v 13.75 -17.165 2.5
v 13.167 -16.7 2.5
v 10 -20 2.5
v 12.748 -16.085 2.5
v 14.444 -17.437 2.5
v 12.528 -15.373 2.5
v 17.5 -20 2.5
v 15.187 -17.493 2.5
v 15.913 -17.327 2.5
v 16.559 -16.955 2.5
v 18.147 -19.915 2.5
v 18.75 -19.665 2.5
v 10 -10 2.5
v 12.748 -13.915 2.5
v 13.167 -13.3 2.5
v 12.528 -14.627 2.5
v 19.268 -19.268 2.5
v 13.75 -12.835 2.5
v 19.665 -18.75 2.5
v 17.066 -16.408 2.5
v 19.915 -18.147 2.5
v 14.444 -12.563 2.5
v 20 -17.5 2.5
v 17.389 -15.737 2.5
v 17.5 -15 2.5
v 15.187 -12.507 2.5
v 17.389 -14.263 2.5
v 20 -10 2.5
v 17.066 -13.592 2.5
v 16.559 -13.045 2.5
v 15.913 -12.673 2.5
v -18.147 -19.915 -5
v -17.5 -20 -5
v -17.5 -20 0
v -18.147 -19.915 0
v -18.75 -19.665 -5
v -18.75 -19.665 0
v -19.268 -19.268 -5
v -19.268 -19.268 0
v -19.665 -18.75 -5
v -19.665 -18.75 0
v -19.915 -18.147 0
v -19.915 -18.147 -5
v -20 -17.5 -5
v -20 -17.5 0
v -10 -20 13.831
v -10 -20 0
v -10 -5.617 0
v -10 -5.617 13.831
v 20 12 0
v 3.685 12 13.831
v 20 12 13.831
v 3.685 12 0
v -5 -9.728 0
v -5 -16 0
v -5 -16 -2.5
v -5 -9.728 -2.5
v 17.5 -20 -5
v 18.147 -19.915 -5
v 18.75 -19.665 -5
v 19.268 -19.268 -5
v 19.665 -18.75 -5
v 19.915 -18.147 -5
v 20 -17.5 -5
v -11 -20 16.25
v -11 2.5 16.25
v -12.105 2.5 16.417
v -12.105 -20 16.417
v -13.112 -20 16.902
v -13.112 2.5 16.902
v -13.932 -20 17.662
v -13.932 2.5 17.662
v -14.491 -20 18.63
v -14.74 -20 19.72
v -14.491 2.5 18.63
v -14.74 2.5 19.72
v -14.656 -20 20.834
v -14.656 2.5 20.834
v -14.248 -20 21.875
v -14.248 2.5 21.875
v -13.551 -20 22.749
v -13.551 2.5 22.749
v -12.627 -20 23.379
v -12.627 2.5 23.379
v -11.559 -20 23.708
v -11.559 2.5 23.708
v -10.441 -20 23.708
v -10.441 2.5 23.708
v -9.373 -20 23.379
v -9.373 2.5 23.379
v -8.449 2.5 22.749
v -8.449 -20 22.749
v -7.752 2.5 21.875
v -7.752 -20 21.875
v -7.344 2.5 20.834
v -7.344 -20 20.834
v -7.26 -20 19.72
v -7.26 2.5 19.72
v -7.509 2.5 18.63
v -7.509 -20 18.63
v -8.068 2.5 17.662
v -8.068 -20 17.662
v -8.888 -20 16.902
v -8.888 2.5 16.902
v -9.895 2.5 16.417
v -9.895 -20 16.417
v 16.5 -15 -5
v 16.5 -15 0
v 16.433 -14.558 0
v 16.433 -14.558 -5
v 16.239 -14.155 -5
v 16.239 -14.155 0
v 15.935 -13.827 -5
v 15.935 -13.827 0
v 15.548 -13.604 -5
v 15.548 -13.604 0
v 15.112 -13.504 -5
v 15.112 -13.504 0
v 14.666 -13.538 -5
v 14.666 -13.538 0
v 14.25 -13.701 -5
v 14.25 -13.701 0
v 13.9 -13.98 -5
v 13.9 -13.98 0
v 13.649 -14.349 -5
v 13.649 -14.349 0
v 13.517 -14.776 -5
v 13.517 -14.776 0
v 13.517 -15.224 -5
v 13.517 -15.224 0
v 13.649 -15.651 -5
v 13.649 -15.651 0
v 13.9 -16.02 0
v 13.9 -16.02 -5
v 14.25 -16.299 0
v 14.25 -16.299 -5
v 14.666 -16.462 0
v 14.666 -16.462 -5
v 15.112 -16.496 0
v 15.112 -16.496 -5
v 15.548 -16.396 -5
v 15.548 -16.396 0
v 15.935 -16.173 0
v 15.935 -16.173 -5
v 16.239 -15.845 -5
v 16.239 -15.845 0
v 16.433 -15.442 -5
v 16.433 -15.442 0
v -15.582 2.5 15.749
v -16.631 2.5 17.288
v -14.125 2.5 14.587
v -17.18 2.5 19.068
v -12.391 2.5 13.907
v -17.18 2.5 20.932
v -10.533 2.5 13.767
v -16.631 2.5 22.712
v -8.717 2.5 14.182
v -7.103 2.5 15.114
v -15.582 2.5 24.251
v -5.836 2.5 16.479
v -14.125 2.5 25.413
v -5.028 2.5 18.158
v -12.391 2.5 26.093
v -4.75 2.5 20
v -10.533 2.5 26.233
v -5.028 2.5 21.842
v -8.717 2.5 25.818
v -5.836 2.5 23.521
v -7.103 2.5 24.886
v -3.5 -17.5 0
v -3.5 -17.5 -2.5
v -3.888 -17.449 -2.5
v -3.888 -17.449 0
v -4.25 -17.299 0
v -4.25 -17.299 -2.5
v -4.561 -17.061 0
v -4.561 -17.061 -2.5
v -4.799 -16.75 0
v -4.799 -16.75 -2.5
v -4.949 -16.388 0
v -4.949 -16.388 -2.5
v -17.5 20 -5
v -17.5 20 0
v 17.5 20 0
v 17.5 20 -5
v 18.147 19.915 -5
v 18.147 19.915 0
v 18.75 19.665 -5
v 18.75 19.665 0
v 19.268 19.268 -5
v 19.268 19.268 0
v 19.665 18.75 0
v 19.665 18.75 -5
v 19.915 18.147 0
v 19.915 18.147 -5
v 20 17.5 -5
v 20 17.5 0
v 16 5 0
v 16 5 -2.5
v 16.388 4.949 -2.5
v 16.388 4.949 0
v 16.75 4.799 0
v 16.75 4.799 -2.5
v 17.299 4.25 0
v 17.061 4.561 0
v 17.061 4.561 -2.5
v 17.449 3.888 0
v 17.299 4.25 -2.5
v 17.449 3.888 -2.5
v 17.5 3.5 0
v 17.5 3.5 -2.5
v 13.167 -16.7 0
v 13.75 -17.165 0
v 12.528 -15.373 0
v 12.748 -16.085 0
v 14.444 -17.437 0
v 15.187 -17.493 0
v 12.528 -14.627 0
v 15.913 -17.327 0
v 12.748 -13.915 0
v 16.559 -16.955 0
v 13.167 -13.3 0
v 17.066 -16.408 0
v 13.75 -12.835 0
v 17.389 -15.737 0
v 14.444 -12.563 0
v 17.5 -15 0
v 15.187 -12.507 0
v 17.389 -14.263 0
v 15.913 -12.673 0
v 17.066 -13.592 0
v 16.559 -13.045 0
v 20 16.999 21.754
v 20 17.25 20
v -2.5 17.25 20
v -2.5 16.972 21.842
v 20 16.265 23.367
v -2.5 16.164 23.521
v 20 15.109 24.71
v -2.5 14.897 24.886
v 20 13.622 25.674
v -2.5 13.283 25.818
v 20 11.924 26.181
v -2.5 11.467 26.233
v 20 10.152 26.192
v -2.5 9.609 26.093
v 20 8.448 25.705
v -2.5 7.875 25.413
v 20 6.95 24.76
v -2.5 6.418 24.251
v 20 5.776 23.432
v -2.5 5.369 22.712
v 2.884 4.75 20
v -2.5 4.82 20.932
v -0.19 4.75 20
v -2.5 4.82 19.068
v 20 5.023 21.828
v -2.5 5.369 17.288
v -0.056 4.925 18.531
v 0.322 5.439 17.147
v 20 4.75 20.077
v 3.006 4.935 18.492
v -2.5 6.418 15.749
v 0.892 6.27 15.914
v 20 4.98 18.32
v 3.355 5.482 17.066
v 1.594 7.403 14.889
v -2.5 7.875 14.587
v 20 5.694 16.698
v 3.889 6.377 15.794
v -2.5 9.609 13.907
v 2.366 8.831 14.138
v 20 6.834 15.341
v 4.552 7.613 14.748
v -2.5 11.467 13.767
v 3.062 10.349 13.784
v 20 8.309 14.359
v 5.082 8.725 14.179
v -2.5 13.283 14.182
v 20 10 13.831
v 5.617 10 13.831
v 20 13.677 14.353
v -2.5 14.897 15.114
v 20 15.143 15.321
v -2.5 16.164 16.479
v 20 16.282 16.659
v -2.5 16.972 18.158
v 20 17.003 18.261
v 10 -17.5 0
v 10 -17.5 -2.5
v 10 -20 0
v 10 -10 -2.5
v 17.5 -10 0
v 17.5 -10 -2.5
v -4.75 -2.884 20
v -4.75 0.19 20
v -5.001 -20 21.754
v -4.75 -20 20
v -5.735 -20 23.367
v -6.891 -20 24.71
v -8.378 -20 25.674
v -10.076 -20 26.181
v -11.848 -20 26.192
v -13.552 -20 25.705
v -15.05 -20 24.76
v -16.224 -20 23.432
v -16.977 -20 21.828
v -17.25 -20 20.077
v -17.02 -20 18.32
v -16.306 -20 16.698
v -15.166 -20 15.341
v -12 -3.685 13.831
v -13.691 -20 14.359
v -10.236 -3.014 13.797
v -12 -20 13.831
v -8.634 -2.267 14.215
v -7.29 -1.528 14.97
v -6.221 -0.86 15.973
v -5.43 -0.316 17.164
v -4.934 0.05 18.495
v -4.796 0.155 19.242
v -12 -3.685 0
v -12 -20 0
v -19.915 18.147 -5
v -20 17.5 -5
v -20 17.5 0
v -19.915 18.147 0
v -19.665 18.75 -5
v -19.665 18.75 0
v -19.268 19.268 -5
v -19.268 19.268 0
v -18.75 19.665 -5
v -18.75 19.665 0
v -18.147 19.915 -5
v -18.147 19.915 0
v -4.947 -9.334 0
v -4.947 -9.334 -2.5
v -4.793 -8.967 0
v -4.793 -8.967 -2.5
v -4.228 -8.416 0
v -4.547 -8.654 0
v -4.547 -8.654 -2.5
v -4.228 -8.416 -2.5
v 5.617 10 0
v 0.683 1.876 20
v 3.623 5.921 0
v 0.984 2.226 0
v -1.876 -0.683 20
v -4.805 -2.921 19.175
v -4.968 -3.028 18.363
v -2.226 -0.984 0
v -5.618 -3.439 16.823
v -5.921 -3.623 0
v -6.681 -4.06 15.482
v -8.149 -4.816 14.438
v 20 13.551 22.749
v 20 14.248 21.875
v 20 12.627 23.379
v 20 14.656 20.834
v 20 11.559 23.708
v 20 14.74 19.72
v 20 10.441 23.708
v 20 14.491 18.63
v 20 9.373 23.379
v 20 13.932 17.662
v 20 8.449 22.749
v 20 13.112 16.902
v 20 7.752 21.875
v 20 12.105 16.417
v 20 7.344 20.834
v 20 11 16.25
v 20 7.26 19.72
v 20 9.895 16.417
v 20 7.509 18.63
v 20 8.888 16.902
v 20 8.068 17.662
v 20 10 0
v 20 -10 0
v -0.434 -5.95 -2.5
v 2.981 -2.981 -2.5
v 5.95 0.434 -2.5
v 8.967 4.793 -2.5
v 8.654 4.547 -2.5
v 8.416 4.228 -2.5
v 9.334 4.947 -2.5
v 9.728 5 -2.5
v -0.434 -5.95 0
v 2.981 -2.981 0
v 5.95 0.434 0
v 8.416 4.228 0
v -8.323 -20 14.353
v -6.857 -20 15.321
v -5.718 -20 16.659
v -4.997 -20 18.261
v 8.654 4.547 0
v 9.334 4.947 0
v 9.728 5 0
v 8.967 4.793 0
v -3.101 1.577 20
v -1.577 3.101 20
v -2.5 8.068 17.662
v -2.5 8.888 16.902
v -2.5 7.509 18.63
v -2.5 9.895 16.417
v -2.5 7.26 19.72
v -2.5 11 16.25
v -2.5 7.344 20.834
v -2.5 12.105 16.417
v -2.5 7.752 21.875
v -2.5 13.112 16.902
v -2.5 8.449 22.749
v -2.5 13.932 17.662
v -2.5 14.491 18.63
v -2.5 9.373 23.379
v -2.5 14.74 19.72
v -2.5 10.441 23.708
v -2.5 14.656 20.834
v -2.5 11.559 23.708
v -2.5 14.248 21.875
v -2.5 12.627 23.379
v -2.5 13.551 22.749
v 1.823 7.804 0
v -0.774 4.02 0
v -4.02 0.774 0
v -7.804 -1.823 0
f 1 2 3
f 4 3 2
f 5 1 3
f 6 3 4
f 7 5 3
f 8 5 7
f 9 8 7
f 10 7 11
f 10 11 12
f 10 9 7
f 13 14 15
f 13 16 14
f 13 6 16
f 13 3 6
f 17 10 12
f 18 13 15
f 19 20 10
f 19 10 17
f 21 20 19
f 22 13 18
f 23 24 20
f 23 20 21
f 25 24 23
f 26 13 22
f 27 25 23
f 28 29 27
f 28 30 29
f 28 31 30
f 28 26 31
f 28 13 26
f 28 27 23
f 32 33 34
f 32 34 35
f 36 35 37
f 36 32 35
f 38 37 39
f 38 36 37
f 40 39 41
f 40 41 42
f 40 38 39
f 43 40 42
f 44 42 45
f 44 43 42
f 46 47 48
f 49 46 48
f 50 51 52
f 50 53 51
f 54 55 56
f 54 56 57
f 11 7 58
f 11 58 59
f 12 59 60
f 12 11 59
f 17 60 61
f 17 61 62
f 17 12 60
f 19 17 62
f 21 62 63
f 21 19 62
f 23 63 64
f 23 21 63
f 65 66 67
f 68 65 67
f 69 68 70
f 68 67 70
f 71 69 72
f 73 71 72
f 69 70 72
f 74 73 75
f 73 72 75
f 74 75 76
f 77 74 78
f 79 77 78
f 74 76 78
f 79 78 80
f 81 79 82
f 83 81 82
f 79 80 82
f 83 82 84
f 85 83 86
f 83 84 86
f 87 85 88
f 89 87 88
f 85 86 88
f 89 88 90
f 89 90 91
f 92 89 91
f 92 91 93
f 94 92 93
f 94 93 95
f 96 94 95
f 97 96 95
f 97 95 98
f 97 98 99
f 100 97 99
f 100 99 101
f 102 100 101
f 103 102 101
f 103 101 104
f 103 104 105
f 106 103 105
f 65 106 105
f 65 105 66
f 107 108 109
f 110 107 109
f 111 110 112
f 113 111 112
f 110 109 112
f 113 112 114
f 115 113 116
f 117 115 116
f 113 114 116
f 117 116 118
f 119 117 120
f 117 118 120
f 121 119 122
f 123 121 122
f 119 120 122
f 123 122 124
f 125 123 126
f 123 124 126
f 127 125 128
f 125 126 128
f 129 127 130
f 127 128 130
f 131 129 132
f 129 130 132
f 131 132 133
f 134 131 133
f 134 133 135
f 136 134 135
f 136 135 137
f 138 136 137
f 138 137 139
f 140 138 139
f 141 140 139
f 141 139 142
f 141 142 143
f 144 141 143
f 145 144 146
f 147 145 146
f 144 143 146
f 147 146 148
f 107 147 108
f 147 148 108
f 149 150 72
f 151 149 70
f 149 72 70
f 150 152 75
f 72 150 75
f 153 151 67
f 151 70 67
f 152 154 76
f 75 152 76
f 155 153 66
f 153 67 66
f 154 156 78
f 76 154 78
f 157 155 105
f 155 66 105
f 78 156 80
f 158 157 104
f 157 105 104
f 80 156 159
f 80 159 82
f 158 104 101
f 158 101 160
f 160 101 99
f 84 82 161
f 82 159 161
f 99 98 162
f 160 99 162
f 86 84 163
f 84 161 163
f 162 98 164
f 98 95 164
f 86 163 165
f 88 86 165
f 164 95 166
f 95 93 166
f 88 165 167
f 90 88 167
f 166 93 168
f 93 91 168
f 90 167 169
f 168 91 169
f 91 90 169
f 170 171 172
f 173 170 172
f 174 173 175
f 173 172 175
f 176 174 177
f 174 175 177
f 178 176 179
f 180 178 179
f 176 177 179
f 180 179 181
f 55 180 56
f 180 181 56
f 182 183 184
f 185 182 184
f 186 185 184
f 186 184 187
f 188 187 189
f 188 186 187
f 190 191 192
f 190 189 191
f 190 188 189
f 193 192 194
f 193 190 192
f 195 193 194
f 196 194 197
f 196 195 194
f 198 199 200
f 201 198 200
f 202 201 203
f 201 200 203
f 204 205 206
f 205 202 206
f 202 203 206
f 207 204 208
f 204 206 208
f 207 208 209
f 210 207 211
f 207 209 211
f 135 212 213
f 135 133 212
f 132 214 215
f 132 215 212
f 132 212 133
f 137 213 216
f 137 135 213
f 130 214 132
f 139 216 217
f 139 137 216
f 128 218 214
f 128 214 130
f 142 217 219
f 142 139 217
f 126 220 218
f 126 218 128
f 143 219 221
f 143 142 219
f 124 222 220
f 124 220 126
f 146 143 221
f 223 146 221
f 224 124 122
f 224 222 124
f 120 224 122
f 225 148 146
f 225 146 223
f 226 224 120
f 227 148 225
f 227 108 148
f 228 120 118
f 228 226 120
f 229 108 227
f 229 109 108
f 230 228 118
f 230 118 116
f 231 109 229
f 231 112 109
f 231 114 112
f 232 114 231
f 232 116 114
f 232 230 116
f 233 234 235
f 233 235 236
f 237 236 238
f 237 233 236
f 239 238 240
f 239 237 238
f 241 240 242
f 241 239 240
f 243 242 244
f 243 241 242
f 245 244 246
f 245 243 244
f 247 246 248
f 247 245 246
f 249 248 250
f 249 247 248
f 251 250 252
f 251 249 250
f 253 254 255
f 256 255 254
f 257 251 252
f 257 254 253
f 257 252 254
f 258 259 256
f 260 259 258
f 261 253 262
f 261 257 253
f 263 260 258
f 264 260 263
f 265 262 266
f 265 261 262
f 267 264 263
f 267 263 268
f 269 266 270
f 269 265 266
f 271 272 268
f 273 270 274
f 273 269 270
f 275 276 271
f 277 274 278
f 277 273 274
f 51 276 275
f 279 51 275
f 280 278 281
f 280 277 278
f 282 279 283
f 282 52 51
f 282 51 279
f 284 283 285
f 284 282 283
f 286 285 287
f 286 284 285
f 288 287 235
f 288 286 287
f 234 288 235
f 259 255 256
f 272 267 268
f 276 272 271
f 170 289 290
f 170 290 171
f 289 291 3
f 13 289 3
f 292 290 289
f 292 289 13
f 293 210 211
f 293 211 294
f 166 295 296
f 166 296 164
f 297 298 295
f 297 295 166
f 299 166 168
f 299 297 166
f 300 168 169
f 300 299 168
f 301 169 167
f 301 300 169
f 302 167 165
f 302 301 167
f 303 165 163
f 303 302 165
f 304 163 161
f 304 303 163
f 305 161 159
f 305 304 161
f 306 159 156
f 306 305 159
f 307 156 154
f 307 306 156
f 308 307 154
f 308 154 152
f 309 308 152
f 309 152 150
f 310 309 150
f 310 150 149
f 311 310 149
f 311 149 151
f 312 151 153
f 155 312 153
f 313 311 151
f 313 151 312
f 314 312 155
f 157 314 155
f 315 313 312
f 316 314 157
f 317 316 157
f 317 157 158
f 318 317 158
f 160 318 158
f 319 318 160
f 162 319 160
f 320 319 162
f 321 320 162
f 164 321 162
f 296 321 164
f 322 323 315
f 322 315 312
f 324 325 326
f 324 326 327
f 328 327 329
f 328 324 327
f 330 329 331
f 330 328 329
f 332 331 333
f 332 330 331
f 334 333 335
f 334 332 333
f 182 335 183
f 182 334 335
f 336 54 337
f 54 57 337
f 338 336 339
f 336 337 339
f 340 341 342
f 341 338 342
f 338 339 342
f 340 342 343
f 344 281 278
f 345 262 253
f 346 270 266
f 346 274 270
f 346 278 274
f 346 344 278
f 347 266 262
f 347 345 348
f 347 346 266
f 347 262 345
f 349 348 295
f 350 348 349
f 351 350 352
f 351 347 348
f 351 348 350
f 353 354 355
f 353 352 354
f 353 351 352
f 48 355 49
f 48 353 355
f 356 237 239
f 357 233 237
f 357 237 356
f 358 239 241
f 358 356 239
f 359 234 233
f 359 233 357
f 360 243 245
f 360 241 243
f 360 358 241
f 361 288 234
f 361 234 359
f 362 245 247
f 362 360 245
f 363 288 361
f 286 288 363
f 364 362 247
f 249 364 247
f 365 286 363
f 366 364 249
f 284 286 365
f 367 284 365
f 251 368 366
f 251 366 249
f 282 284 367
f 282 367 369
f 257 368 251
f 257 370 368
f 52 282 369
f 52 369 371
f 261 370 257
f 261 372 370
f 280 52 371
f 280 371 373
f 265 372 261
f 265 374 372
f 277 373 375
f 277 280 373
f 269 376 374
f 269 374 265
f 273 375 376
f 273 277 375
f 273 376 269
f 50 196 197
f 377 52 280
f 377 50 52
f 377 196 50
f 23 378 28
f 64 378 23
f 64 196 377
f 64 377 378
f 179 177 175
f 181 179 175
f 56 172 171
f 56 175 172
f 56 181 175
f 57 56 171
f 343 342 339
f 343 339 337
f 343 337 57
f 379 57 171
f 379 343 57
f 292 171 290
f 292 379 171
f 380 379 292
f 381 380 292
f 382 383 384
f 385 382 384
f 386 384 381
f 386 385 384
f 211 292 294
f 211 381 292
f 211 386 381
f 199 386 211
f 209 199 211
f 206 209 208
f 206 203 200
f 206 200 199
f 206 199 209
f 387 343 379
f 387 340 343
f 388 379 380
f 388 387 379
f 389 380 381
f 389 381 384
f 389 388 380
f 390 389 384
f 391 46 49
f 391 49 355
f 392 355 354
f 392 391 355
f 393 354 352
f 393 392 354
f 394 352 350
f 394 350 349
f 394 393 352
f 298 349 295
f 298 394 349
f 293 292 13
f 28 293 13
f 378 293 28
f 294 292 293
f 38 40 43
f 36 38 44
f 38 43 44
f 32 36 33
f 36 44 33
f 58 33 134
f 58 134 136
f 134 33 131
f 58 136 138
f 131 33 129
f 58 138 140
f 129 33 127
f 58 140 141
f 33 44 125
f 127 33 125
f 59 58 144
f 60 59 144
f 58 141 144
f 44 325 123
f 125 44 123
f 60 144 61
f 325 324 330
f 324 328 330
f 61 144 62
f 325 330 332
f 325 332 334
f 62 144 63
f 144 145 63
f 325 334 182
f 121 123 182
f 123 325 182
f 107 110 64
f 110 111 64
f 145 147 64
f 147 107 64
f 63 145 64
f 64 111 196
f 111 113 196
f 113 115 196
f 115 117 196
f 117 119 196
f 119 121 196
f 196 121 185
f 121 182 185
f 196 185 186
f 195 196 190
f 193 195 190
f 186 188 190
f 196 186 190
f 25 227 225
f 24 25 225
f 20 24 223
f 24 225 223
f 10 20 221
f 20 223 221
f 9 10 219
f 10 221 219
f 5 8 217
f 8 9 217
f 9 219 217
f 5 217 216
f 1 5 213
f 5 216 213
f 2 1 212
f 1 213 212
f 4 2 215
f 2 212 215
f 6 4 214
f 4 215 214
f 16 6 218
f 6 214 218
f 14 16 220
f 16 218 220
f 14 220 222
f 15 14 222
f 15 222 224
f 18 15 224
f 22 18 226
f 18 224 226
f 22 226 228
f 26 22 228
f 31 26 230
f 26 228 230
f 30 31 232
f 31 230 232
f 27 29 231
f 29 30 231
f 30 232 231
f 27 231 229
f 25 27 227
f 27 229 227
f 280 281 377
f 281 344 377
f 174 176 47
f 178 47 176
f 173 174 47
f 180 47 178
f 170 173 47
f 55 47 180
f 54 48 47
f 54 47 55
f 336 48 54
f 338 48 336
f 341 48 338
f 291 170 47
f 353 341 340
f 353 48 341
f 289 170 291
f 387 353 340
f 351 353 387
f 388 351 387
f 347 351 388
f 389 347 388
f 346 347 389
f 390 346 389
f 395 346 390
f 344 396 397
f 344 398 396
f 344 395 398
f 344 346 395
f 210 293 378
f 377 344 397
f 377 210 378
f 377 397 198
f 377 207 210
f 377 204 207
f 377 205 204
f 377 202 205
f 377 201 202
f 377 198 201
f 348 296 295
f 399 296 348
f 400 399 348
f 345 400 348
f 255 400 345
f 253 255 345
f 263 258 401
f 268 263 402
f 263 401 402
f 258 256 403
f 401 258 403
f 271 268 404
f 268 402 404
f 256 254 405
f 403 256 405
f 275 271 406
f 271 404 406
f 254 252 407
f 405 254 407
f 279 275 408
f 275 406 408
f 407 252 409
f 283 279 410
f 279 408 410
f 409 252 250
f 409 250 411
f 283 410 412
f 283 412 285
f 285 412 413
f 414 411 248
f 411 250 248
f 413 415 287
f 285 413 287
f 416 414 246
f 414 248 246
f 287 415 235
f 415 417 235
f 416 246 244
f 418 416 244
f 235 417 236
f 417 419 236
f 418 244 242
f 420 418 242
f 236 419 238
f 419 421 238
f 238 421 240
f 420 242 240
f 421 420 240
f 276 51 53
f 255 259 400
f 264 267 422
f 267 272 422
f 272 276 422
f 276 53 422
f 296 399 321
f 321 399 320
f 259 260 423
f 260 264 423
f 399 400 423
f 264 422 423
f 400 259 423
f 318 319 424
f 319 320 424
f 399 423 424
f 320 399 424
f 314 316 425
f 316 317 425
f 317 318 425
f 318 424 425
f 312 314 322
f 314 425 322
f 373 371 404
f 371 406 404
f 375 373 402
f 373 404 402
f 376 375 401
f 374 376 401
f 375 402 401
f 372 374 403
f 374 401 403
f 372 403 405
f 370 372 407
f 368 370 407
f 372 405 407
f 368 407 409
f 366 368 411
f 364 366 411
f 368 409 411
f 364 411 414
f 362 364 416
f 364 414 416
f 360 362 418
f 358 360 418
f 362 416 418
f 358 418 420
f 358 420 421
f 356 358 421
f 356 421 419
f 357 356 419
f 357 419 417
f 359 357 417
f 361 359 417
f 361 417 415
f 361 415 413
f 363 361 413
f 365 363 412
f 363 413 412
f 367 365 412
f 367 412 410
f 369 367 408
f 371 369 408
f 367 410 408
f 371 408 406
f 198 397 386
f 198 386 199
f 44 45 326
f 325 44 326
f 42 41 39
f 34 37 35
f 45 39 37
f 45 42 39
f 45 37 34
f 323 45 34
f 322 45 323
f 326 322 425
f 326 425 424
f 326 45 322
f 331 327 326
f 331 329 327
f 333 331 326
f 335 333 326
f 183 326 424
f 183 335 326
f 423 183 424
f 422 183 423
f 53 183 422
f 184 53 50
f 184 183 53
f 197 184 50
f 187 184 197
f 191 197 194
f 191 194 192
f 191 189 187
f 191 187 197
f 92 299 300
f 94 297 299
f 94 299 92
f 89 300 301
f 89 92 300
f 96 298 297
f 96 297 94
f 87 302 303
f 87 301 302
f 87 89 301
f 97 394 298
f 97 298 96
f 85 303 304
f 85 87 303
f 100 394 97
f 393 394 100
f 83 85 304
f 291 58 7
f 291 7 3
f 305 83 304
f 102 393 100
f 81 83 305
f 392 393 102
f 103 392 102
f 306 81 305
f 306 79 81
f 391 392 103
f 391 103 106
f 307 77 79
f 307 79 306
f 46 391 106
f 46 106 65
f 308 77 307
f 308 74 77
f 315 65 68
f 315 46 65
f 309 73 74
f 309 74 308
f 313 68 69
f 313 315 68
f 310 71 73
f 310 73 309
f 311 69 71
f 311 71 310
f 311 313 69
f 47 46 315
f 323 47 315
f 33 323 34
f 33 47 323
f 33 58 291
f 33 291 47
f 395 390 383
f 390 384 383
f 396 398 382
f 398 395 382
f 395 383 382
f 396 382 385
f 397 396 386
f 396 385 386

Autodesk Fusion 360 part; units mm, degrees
sketch "Sketch1" plane through (0, 0, 0) normal (0, 0, 1) x (1, 0, 0)
  line L0 (20, -20) -> (-20, -20)
  line L1 (-20, -20) -> (-20, 20)
  line L2 (-20, 20) -> (20, 20)
  line L3 (20, 20) -> (20, -20)
  line L4 (-20, -20) -> (20, 20) construction
  line L5 (20, -20) -> (10, -20)
  line L6 (10, -20) -> (10, -10)
  line L7 (10, -10) -> (20, -10)
  line L8 (20, -10) -> (20, -20)
  line L9 (-12, -20) -> (-12, -3.6854)
  line L10 (3.6854, 12) -> (20, 12)
  line L11 (-10, -20) -> (-10, -5.6174)
  line L12 (5.6174, 10) -> (20, 10)
  arc A0 (-10, -5.6174) -> (5.6174, 10) centre (-20, 20) ccw
  arc A1 (-12, -3.6854) -> (3.6854, 12) centre (-20, 20) ccw
  line L13 (20, -20) -> (-2.3223, 2.3223) construction
  line L14 (-10, 10) -> (-20, 20) construction
  line L15 (17.5, 5) -> (17.5, -10)
  line L16 (10, -17.5) -> (-5, -17.5)
  line L17 (-5, -17.5) -> (-5, -8.8314)
  arc A2 (-5, -8.8314) -> (8.8314, 5) centre (-20, 20) ccw
  line L18 (8.8314, 5) -> (17.5, 5)
  circle A3 centre (15, -15) radius 2.5
  circle A4 centre (15, -15) radius 1.5
  dimension "d1" = 40
  dimension "d2" = 40
  dimension "d3" = 10
  dimension "d4" = 10
  dimension "d5" = 50
  dimension "d6" = 55
  dimension "d7" = 8
  dimension "d9" = 2.5
  dimension "d10" = 2.5
  dimension "d12" = 5
  dimension "d13" = 3
  dimension "d14" = 5
extrude "Extrude1" add sketch "Sketch1" against normal blind 5 contours L0 L3 L5 L6 L7 L8 | L0 L3 L6 L7 L11 L12 A0 L15 L16 L17 A2 L18 | L0 L3 L9 L10 L11 L12 A0 A1 | L6 L7 L15 L16 L17 A2 L18 | L0 L1 L2 L3 L9 L10 A1 | A3 | A4
extrude "Extrude2" cut sketch "Sketch1" against normal blind 2.5 contours L6 L7 L15 L16 L17 A2 L18
extrude "Extrude3" cut sketch "Sketch1" against normal blind 17 contours A4
extrude "Extrude4" add sketch "Sketch1" along normal blind 2.5 contours L0 L3 L5 L6 L7 L8
extrude "Extrude5" add sketch "Sketch1" along normal blind 20 contours L0 L3 L9 L10 L11 L12 A0 A1
fillet "Fillet1" radius 2.5 4 edges at (20, -20, -1.25) (20, 20, -2.5) (-20, -20, -2.5) (-20, 20, -2.5)
fillet "Fillet2" radius 1.5 4 edges at (-5, -8.8314, -1.25) (8.8314, 5, -1.25) (-5, -17.5, -1.25) (17.5, 5, -1.25)
sketch "Sketch2" plane through (0, -20, 0) normal (0, -1, 0) x (1, 0, 0)
  line L0 (-17.5, 0) -> (-17.5, -5)
  line L1 (-17.5, -5) -> (17.5, -5)
  line L2 (17.5, -5) -> (17.5, 2.5)
  line L3 (17.5, 2.5) -> (10, 2.5)
  line L4 (10, 2.5) -> (10, 0)
  line L5 (10, 0) -> (-10, 0)
  line L6 (-10, 0) -> (-10, 20)
  line L7 (-10, 20) -> (-12, 20)
  line L8 (-12, 20) -> (-12, 0)
  line L9 (-12, 0) -> (-17.5, 0)
  circle A0 centre (-11, 20) radius 6.25
  dimension "d29" = 12.5
extrude "Extrude6" add sketch "Sketch2" against normal blind 22.5 contours L6 L7 L8 A0 | L6 L7 L8 A0
sketch "Sketch3" plane through (20, 0, 0) normal (1, 0, 0) x (0, 1, 0)
  line L0 (17.5, -5) -> (17.5, 0)
  line L1 (17.5, 0) -> (12, 0)
  line L2 (12, 0) -> (12, 20)
  line L3 (12, 20) -> (10, 20)
  line L4 (10, 20) -> (10, 0)
  line L5 (10, 0) -> (-10, 0)
  line L6 (-10, 0) -> (-10, 2.5)
  line L7 (-10, 2.5) -> (-17.5, 2.5)
  line L8 (-17.5, 2.5) -> (-17.5, -5)
  line L9 (-17.5, -5) -> (17.5, -5)
  circle A0 centre (11, 20) radius 6.25
  dimension "d32" = 12.5
extrude "Extrude7" add sketch "Sketch3" against normal blind 22.5 contours L2 L3 L4 A0 | L2 L3 L4 A0
hole "Hole1" at (-11, -20, 20) direction (0, 1, 0) diameter 7.5 end through all
hole "Hole2" at (20, 11, 20) direction (-1, 0, 0) diameter 7.5 end through all
